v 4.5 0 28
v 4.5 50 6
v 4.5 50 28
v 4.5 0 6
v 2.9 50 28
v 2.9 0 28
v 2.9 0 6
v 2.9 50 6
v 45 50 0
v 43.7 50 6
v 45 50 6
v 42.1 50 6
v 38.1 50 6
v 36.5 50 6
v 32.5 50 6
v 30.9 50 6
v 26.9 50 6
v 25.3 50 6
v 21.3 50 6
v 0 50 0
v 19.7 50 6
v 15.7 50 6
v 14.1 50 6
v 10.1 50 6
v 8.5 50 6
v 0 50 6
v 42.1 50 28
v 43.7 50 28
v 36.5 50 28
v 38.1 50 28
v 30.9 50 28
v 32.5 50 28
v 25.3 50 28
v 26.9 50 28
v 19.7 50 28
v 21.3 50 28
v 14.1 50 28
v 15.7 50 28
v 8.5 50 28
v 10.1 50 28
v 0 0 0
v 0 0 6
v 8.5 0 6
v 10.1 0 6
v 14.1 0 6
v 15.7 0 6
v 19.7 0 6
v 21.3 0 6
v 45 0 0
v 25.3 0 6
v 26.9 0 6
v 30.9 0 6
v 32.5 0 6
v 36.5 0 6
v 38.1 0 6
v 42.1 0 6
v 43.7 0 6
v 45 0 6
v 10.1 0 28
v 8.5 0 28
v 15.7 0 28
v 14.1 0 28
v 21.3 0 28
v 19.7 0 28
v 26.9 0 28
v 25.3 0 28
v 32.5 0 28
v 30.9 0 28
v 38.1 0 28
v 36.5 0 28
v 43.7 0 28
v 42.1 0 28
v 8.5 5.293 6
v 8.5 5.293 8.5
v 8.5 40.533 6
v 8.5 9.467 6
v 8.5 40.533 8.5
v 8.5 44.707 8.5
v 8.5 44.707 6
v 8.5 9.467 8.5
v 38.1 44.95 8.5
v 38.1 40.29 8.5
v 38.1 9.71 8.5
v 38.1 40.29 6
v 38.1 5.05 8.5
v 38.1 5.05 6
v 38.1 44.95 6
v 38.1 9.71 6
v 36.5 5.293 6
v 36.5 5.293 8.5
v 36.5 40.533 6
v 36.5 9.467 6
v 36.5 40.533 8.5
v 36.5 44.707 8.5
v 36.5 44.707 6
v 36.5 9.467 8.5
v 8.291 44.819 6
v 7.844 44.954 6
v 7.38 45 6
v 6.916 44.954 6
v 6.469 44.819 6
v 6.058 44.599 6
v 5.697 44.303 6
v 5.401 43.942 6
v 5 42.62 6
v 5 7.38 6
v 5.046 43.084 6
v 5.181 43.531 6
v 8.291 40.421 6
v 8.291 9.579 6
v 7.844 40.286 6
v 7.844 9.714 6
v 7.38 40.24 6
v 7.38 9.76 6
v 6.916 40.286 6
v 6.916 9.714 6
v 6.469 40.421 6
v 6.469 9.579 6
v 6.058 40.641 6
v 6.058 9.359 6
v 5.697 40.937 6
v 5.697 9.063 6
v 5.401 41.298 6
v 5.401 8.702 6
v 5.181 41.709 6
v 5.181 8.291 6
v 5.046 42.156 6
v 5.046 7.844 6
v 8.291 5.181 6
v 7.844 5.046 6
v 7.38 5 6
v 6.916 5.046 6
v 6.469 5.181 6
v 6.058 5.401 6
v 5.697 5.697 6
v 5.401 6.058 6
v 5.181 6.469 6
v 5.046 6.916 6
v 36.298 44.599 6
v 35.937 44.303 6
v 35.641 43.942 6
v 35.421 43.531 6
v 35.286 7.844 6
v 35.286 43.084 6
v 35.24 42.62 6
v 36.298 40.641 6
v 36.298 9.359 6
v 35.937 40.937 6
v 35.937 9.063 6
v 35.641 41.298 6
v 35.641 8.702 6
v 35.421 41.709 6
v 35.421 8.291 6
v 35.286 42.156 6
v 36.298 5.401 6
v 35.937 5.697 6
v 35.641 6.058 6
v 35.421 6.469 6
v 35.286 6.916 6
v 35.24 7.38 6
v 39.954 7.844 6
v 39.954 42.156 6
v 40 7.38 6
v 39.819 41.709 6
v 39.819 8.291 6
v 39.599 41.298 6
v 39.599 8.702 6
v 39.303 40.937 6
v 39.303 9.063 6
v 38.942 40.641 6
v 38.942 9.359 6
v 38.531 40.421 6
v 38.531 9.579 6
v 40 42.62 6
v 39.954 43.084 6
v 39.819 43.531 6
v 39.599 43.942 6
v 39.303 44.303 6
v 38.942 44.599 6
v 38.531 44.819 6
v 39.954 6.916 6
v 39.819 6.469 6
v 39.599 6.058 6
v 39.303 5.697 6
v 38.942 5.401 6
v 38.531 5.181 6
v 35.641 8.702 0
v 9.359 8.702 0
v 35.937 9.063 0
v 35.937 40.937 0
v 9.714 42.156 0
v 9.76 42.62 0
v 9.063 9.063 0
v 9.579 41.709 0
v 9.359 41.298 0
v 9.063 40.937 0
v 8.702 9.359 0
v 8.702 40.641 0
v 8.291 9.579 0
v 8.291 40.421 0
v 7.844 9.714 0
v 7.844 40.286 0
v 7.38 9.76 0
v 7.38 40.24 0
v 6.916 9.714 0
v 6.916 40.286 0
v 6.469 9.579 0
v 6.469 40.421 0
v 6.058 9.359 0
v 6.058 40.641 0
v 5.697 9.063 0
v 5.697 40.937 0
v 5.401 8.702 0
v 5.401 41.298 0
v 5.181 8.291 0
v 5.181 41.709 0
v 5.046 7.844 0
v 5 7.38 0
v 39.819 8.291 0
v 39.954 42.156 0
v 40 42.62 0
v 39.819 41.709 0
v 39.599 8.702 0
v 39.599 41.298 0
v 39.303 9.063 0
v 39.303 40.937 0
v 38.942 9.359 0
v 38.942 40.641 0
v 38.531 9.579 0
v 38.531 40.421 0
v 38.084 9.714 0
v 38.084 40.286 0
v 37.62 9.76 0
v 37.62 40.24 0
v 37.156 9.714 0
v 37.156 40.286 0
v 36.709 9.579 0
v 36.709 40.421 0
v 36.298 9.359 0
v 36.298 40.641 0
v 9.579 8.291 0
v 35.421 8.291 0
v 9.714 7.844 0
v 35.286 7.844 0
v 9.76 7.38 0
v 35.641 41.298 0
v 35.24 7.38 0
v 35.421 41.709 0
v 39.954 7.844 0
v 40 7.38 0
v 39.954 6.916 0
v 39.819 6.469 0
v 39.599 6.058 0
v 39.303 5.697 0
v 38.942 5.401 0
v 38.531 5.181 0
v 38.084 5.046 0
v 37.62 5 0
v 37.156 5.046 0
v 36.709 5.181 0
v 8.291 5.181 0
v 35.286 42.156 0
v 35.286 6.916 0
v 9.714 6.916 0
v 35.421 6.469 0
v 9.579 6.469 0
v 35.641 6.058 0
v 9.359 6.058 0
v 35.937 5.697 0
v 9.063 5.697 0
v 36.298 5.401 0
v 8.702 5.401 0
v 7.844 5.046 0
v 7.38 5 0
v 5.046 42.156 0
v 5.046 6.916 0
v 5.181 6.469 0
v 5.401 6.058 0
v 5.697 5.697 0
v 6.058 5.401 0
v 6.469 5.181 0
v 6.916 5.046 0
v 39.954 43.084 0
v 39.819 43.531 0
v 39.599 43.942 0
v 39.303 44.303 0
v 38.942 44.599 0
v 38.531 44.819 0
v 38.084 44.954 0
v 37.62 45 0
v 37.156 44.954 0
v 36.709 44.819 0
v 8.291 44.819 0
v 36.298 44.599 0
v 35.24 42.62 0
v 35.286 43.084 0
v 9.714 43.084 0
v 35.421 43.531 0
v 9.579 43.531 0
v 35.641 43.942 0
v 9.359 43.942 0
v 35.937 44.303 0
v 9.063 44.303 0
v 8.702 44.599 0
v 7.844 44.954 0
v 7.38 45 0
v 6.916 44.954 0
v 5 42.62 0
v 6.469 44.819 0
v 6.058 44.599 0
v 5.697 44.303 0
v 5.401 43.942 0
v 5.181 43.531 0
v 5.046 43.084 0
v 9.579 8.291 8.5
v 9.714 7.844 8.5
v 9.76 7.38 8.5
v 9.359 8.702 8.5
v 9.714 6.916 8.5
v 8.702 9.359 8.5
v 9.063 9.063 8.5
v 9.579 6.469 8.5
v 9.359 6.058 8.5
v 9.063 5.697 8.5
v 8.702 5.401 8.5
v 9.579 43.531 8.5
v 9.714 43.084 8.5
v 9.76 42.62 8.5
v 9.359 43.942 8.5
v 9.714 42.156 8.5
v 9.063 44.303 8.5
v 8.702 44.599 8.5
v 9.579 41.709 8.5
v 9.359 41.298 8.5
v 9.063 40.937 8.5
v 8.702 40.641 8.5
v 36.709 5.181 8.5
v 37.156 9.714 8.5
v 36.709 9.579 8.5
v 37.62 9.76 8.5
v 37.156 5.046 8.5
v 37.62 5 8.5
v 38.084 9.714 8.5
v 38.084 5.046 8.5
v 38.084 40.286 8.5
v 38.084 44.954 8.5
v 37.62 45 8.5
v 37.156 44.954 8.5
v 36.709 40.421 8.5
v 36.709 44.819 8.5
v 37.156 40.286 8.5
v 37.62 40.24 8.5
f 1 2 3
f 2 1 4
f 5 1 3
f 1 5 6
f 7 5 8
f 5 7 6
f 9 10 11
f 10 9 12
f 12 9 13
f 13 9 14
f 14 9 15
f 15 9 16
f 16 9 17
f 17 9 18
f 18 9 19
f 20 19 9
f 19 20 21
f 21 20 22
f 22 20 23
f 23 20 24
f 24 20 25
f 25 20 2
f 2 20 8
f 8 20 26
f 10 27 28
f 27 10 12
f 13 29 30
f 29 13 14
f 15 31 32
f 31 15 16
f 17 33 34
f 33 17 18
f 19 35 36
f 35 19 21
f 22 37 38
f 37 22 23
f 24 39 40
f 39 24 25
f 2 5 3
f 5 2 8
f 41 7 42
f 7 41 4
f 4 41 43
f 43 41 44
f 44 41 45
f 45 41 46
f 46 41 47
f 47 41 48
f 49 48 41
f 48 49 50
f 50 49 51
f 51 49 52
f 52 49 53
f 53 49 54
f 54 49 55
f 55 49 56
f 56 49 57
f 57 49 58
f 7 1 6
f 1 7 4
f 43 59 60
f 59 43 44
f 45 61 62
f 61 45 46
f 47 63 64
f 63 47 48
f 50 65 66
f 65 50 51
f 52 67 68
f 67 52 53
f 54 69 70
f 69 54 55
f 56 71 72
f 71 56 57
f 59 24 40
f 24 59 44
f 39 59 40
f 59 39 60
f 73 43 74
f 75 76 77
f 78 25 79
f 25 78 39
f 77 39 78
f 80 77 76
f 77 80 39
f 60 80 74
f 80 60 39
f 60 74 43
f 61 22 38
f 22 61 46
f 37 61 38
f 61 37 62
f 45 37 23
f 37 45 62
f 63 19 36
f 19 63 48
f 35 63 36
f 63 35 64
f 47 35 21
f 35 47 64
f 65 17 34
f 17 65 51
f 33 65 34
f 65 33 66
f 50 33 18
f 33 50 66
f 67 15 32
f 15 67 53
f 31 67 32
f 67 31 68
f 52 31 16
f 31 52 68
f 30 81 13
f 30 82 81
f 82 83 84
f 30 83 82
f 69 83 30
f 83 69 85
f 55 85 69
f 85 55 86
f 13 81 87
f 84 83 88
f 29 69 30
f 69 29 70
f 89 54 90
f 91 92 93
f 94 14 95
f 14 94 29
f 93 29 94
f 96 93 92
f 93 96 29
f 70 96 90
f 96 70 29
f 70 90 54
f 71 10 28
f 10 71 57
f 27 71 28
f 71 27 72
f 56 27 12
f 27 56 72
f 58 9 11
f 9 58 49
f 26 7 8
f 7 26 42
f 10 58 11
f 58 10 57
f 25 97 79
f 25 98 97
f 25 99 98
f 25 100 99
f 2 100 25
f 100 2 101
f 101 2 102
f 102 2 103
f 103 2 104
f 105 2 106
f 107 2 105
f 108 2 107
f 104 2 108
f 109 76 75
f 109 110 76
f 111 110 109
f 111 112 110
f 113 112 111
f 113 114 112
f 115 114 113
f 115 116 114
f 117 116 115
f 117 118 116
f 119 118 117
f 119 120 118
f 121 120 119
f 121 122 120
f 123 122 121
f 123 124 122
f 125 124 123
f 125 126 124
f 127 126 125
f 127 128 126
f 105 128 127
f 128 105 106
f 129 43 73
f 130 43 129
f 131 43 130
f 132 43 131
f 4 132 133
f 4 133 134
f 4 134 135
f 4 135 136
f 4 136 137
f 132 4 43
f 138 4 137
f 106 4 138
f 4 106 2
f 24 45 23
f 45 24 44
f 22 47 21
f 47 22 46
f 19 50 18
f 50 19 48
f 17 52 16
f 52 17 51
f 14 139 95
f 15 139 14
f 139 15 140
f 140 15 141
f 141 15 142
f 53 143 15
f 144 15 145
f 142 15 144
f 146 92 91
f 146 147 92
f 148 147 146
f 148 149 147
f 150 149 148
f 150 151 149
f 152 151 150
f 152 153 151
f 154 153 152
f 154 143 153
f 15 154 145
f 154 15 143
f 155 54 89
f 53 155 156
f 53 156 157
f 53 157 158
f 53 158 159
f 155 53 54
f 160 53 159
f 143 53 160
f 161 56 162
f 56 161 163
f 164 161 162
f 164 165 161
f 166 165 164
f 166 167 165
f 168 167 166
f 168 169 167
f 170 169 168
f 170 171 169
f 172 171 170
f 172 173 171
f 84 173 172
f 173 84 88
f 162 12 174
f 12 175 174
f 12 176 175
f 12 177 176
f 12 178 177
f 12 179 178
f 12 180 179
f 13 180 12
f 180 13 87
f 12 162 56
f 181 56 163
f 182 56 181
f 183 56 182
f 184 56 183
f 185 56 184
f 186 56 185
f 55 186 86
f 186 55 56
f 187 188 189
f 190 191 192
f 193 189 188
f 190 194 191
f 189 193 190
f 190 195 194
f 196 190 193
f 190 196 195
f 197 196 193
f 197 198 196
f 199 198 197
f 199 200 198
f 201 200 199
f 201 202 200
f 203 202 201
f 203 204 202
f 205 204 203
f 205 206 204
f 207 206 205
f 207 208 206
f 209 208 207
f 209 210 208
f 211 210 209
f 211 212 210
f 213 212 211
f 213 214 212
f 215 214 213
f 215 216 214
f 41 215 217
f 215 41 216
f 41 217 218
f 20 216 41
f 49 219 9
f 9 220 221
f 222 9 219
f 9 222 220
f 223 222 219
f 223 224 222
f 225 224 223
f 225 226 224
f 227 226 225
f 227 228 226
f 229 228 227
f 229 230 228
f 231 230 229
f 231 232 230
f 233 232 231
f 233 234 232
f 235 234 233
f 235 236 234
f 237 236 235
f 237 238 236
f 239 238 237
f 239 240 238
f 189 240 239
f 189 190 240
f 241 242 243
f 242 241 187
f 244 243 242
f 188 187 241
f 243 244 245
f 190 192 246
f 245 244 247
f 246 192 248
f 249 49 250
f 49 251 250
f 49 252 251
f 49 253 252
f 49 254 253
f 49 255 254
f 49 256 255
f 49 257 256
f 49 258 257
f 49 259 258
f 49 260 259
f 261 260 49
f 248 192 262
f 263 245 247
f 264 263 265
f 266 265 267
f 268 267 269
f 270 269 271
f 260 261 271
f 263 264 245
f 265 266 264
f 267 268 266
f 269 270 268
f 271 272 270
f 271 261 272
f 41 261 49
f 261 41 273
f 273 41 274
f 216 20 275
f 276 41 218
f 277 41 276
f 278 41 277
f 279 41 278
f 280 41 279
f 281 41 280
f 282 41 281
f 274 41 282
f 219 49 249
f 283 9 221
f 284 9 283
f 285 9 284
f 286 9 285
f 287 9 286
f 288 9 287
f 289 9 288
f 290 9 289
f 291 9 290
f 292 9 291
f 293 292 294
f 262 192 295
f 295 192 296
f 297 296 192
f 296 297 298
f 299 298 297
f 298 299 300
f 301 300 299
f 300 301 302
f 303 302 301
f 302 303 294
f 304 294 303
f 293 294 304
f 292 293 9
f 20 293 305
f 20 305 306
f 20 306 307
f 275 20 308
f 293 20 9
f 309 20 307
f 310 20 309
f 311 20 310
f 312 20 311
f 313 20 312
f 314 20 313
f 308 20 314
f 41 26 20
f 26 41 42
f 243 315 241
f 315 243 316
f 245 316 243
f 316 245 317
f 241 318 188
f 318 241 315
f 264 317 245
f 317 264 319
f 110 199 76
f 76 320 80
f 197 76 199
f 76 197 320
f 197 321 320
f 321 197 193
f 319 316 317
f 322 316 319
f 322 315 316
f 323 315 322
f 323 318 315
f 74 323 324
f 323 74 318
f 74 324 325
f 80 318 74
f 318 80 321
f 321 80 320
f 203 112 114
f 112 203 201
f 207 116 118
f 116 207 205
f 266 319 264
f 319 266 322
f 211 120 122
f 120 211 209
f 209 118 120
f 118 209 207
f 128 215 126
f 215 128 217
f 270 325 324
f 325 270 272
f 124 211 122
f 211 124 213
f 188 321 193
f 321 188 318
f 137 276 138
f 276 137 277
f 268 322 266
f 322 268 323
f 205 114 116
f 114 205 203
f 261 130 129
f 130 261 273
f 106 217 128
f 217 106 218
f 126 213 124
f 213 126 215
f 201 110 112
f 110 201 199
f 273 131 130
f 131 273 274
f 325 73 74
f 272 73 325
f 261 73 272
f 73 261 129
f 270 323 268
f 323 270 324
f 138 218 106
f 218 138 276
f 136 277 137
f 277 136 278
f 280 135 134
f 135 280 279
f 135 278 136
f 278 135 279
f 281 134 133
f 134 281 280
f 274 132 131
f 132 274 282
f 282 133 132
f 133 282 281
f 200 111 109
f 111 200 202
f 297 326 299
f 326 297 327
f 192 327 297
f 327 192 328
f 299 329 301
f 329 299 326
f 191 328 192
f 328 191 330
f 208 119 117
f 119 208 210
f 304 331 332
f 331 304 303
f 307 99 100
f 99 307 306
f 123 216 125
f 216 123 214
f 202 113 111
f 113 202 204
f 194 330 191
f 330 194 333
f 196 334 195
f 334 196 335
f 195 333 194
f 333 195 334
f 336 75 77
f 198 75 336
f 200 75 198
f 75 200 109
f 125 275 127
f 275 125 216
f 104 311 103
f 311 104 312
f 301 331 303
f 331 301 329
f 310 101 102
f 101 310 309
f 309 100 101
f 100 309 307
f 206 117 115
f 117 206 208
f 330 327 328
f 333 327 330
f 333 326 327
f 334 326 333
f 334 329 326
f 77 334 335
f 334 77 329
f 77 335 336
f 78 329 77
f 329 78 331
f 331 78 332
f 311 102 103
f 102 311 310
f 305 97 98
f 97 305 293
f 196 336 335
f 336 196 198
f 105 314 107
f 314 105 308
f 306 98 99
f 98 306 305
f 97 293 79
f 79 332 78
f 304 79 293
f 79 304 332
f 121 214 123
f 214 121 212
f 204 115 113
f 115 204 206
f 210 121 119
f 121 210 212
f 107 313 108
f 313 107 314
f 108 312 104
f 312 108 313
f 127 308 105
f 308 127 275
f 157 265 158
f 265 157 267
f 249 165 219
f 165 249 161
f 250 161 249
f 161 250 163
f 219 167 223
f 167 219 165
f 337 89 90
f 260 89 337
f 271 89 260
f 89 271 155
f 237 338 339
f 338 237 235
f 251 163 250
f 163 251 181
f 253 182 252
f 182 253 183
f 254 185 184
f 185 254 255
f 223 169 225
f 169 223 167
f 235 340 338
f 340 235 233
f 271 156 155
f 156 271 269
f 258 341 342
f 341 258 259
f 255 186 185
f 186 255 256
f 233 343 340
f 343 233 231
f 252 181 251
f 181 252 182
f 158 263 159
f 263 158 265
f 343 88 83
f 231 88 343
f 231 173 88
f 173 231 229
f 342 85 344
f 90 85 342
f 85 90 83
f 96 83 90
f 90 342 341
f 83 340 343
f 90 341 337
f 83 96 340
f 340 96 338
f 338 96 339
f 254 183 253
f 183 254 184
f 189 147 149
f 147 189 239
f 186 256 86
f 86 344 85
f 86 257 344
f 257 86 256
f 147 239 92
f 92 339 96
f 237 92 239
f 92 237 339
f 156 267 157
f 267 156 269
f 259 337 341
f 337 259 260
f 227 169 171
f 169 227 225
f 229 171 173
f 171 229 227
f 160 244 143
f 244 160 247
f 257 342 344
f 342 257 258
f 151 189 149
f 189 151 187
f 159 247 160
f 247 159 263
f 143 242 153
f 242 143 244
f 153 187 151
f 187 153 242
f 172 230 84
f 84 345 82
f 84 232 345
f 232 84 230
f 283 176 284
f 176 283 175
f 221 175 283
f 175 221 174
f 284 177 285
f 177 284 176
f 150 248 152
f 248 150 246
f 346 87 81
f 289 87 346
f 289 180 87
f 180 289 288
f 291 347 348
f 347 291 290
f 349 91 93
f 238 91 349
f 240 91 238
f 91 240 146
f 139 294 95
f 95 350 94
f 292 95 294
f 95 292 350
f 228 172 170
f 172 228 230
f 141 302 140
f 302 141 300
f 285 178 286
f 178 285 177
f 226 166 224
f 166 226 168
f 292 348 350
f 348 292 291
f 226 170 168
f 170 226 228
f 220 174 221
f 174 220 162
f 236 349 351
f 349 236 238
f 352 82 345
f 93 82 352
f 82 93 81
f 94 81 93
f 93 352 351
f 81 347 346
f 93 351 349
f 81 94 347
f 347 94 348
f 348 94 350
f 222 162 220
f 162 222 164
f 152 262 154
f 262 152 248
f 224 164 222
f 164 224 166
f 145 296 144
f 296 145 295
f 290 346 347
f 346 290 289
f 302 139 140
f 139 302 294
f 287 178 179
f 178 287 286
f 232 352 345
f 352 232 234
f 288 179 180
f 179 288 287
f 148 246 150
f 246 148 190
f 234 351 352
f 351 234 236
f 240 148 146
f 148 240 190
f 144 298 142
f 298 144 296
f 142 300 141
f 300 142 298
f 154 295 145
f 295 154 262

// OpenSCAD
$fn = 32;

// ----------------------------------------------------------------------
// Finned heat sink: 45 x 50 mm base, 22 mm fins
// ----------------------------------------------------------------------

// --- parameters (mm) ---
base_w = 45;              // base width
base_d = 50;              // base depth
base_t = 6;               // base thickness
fin_h = 22;               // fin height above the base
holes_d = 4.76;           // fixing holes
hole_x = 15.12;           // hole offset in x
hole_y = 17.62;           // hole offset in y
fin_t = 1.6;              // fin thickness
fin_pitch = 5.6;          // fin pitch
fin_count = 8;            // number of fins
fin_x0 = 2.9;             // first fin offset

difference() {
  union() {
    cube([base_w, base_d, base_t]);
    for (i = [0 : fin_count - 1]) {
      translate([fin_x0 + i * fin_pitch, 0, base_t - 0.5]) cube([fin_t, base_d, fin_h + 0.5]);
    }
  }
  /* fixing holes through the base, 2.5 mm clear on both sides */
  for (hx = [-15.12, 15.12]) {
    for (hy = [-17.62, 17.62]) {
      translate([base_w / 2 + hx, base_d / 2 + hy, -2.5]) cylinder(h = base_t + 5, d = holes_d);
    }
  }
}
